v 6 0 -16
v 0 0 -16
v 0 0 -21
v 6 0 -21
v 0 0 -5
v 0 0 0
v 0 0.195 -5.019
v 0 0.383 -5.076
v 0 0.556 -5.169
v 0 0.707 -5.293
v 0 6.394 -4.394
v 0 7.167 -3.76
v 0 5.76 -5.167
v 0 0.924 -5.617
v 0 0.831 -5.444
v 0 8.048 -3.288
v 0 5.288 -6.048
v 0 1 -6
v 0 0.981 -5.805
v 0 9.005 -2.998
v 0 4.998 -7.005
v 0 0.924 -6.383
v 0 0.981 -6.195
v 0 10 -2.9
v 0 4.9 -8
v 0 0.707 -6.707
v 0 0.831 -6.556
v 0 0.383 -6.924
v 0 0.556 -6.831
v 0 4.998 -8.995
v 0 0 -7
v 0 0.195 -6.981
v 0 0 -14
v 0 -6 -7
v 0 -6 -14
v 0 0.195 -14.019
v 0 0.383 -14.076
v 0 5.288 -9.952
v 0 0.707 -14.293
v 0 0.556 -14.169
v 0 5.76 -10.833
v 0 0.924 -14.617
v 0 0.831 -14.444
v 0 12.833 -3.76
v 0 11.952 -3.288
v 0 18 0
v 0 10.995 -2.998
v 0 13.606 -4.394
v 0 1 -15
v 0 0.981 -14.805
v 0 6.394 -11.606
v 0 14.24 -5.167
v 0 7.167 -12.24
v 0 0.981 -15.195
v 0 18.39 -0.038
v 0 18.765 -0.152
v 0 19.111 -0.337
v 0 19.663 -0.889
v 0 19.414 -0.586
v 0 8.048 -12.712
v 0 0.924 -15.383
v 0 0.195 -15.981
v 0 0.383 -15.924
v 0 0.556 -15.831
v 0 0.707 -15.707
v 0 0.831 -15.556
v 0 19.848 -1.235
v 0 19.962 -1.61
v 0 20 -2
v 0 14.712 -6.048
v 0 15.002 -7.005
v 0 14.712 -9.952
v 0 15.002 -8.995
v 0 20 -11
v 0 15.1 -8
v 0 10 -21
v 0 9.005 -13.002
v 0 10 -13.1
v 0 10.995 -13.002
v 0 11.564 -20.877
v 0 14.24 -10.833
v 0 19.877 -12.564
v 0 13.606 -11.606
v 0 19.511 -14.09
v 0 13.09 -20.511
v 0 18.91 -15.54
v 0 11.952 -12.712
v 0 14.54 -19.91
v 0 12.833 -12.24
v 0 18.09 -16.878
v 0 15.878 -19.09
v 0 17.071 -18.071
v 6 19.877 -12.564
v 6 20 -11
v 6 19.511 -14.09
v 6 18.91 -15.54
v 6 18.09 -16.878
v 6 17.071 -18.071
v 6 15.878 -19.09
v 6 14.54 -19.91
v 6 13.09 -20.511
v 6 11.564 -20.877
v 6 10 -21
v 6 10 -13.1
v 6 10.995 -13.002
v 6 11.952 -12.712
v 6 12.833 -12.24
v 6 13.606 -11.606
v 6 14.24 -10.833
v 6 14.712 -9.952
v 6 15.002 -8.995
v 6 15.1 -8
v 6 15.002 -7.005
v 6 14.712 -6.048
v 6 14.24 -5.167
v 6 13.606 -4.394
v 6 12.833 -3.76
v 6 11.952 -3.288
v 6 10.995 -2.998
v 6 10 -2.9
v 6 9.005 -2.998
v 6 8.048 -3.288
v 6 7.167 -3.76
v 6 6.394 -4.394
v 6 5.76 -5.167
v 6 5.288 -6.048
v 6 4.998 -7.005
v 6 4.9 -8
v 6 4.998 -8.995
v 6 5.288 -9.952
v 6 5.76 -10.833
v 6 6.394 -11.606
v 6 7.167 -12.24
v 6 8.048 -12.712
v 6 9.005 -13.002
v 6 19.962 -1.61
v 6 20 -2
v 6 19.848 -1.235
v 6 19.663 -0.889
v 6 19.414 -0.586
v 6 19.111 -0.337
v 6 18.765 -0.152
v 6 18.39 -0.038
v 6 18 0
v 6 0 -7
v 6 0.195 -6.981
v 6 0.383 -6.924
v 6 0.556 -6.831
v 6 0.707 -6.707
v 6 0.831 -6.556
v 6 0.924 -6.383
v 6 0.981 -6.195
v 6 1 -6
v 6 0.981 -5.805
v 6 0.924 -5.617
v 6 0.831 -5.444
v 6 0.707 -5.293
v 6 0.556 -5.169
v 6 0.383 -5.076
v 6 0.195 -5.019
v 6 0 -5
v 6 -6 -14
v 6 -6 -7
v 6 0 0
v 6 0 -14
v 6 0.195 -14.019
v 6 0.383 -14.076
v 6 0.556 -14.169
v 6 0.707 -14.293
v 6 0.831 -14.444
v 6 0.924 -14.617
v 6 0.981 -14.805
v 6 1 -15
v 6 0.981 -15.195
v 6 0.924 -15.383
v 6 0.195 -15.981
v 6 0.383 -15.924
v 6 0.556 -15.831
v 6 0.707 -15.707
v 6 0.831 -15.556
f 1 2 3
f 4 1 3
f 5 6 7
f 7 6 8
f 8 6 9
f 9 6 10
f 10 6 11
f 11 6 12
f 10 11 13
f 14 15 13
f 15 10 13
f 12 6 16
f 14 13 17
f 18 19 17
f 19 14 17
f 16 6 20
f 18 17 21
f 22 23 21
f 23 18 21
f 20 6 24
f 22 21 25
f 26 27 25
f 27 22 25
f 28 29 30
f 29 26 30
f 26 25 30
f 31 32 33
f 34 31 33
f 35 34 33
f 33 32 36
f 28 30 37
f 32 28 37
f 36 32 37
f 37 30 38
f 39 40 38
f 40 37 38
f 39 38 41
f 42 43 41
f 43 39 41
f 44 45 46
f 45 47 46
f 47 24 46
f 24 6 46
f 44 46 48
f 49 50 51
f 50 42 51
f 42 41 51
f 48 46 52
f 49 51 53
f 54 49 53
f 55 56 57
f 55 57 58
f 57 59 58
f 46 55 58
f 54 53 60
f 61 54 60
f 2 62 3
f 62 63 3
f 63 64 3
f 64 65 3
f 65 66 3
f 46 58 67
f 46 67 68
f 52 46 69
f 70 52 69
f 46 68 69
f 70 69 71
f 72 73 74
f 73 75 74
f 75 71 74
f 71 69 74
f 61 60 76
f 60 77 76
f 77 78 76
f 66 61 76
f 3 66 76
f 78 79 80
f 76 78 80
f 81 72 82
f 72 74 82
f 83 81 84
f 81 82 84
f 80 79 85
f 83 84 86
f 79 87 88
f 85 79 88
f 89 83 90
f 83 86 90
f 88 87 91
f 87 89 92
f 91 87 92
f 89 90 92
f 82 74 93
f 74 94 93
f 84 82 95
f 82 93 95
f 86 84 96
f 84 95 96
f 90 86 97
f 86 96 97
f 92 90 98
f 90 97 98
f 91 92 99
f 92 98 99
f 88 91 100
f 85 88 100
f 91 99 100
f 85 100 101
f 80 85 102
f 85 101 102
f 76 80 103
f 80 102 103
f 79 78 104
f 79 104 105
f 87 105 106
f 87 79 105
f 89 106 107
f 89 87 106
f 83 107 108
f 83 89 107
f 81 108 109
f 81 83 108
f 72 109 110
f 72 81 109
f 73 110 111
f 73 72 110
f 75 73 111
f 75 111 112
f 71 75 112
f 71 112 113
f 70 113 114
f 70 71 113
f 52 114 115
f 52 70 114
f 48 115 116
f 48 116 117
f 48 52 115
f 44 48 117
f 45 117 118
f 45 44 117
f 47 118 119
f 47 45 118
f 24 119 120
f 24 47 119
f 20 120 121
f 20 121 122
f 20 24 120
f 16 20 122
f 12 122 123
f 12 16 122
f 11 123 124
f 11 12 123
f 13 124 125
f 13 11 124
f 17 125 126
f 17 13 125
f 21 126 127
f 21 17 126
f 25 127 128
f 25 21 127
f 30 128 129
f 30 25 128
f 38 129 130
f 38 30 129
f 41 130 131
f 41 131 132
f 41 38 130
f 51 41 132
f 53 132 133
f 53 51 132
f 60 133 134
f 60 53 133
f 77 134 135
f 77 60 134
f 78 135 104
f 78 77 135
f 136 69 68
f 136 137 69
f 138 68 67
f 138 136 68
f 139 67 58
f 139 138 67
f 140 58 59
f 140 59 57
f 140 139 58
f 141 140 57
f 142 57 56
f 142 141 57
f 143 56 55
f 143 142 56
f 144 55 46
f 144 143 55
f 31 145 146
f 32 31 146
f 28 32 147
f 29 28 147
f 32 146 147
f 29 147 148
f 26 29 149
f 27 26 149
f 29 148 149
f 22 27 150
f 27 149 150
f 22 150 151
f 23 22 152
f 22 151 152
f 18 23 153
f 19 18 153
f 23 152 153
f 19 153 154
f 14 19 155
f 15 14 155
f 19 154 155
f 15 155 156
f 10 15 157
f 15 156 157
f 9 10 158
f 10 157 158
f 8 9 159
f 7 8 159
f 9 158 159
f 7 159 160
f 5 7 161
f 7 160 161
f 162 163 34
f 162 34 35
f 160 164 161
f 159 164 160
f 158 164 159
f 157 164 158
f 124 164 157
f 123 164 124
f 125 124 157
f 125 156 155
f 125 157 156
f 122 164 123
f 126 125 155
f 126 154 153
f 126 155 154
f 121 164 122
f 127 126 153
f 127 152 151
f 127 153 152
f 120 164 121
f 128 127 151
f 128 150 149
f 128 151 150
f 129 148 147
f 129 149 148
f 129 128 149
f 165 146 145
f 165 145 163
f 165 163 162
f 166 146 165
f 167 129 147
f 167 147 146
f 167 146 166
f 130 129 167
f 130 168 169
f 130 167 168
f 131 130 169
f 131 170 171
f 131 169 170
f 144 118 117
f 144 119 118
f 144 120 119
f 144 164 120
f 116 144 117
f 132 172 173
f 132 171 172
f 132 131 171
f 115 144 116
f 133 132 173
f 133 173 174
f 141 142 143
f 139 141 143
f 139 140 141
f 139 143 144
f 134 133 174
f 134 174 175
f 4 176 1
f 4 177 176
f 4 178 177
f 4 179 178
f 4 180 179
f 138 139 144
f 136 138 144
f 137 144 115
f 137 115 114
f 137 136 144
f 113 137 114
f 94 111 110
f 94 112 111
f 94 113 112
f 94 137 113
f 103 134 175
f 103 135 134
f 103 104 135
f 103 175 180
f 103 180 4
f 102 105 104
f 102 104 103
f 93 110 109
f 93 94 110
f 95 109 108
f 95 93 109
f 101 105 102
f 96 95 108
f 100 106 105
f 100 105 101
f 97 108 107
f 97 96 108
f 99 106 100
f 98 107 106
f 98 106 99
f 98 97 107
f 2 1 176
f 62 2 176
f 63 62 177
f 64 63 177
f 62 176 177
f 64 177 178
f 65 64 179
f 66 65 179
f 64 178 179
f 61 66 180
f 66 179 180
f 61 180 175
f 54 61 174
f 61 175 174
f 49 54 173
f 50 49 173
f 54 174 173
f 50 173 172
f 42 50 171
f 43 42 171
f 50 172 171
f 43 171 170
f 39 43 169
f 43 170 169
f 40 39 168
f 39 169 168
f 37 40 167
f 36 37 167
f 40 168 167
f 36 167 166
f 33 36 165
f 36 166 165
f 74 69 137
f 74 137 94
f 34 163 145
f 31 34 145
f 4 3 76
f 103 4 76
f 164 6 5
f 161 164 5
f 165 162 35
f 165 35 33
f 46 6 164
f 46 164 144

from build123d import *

# Parameters (mm, degrees)
SKETCH_1_W          = 21
SKETCH_1_H          = 20
SKETCH_1_R          = 5.1
EXTRUDE_1_DEPTH     = 6
FILLET_1_R          = 10
FILLET_2_R          = 2
SKETCH_2_W          = 7
SKETCH_2_H          = 6
EXTRUDE_2_DEPTH     = 6
SKETCH_3_R          = 1
CUT_EXTRUDE_1_DEPTH = 10


with BuildPart() as part:
    # 스케치1 → 보스-돌출1 (new body)
    with BuildSketch(Plane(origin=(0, 0, 0), x_dir=(0, 0, -1), z_dir=(1, 0, 0))):
        with Locations((10.5, 10)):
            Rectangle(SKETCH_1_W, SKETCH_1_H)
        with Locations((8, 10)):
            Circle(SKETCH_1_R, mode=Mode.SUBTRACT)
    extrude(amount=EXTRUDE_1_DEPTH)

    # 필렛1
    fillet_1_edges = [part.edges().sort_by_distance(p)[0] for p in [
        (3, 20, -21),
    ]]
    fillet(fillet_1_edges, radius=FILLET_1_R)

    # 필렛2
    fillet_2_edges = [part.edges().sort_by_distance(p)[0] for p in [
        (3, 20, 0),
    ]]
    fillet(fillet_2_edges, radius=FILLET_2_R)

    # 스케치2 → 보스-돌출2 (add)
    with BuildSketch(Plane(origin=(6, 0, 0), x_dir=(0, 0, -1), z_dir=(1, 0, 0))):
        with Locations((10.5, -3)):
            Rectangle(SKETCH_2_W, SKETCH_2_H)
    extrude(amount=-EXTRUDE_2_DEPTH)

    # 스케치3 → 컷-돌출1 (cut)
    with BuildSketch(Plane(origin=(6, 0, 0), x_dir=(0, 0, -1), z_dir=(1, 0, 0))):
        with Locations((15, 0)):
            Circle(SKETCH_3_R)
        with Locations((6, 0)):
            Circle(SKETCH_3_R)
    extrude(amount=-CUT_EXTRUDE_1_DEPTH, mode=Mode.SUBTRACT)


solid = part.part
